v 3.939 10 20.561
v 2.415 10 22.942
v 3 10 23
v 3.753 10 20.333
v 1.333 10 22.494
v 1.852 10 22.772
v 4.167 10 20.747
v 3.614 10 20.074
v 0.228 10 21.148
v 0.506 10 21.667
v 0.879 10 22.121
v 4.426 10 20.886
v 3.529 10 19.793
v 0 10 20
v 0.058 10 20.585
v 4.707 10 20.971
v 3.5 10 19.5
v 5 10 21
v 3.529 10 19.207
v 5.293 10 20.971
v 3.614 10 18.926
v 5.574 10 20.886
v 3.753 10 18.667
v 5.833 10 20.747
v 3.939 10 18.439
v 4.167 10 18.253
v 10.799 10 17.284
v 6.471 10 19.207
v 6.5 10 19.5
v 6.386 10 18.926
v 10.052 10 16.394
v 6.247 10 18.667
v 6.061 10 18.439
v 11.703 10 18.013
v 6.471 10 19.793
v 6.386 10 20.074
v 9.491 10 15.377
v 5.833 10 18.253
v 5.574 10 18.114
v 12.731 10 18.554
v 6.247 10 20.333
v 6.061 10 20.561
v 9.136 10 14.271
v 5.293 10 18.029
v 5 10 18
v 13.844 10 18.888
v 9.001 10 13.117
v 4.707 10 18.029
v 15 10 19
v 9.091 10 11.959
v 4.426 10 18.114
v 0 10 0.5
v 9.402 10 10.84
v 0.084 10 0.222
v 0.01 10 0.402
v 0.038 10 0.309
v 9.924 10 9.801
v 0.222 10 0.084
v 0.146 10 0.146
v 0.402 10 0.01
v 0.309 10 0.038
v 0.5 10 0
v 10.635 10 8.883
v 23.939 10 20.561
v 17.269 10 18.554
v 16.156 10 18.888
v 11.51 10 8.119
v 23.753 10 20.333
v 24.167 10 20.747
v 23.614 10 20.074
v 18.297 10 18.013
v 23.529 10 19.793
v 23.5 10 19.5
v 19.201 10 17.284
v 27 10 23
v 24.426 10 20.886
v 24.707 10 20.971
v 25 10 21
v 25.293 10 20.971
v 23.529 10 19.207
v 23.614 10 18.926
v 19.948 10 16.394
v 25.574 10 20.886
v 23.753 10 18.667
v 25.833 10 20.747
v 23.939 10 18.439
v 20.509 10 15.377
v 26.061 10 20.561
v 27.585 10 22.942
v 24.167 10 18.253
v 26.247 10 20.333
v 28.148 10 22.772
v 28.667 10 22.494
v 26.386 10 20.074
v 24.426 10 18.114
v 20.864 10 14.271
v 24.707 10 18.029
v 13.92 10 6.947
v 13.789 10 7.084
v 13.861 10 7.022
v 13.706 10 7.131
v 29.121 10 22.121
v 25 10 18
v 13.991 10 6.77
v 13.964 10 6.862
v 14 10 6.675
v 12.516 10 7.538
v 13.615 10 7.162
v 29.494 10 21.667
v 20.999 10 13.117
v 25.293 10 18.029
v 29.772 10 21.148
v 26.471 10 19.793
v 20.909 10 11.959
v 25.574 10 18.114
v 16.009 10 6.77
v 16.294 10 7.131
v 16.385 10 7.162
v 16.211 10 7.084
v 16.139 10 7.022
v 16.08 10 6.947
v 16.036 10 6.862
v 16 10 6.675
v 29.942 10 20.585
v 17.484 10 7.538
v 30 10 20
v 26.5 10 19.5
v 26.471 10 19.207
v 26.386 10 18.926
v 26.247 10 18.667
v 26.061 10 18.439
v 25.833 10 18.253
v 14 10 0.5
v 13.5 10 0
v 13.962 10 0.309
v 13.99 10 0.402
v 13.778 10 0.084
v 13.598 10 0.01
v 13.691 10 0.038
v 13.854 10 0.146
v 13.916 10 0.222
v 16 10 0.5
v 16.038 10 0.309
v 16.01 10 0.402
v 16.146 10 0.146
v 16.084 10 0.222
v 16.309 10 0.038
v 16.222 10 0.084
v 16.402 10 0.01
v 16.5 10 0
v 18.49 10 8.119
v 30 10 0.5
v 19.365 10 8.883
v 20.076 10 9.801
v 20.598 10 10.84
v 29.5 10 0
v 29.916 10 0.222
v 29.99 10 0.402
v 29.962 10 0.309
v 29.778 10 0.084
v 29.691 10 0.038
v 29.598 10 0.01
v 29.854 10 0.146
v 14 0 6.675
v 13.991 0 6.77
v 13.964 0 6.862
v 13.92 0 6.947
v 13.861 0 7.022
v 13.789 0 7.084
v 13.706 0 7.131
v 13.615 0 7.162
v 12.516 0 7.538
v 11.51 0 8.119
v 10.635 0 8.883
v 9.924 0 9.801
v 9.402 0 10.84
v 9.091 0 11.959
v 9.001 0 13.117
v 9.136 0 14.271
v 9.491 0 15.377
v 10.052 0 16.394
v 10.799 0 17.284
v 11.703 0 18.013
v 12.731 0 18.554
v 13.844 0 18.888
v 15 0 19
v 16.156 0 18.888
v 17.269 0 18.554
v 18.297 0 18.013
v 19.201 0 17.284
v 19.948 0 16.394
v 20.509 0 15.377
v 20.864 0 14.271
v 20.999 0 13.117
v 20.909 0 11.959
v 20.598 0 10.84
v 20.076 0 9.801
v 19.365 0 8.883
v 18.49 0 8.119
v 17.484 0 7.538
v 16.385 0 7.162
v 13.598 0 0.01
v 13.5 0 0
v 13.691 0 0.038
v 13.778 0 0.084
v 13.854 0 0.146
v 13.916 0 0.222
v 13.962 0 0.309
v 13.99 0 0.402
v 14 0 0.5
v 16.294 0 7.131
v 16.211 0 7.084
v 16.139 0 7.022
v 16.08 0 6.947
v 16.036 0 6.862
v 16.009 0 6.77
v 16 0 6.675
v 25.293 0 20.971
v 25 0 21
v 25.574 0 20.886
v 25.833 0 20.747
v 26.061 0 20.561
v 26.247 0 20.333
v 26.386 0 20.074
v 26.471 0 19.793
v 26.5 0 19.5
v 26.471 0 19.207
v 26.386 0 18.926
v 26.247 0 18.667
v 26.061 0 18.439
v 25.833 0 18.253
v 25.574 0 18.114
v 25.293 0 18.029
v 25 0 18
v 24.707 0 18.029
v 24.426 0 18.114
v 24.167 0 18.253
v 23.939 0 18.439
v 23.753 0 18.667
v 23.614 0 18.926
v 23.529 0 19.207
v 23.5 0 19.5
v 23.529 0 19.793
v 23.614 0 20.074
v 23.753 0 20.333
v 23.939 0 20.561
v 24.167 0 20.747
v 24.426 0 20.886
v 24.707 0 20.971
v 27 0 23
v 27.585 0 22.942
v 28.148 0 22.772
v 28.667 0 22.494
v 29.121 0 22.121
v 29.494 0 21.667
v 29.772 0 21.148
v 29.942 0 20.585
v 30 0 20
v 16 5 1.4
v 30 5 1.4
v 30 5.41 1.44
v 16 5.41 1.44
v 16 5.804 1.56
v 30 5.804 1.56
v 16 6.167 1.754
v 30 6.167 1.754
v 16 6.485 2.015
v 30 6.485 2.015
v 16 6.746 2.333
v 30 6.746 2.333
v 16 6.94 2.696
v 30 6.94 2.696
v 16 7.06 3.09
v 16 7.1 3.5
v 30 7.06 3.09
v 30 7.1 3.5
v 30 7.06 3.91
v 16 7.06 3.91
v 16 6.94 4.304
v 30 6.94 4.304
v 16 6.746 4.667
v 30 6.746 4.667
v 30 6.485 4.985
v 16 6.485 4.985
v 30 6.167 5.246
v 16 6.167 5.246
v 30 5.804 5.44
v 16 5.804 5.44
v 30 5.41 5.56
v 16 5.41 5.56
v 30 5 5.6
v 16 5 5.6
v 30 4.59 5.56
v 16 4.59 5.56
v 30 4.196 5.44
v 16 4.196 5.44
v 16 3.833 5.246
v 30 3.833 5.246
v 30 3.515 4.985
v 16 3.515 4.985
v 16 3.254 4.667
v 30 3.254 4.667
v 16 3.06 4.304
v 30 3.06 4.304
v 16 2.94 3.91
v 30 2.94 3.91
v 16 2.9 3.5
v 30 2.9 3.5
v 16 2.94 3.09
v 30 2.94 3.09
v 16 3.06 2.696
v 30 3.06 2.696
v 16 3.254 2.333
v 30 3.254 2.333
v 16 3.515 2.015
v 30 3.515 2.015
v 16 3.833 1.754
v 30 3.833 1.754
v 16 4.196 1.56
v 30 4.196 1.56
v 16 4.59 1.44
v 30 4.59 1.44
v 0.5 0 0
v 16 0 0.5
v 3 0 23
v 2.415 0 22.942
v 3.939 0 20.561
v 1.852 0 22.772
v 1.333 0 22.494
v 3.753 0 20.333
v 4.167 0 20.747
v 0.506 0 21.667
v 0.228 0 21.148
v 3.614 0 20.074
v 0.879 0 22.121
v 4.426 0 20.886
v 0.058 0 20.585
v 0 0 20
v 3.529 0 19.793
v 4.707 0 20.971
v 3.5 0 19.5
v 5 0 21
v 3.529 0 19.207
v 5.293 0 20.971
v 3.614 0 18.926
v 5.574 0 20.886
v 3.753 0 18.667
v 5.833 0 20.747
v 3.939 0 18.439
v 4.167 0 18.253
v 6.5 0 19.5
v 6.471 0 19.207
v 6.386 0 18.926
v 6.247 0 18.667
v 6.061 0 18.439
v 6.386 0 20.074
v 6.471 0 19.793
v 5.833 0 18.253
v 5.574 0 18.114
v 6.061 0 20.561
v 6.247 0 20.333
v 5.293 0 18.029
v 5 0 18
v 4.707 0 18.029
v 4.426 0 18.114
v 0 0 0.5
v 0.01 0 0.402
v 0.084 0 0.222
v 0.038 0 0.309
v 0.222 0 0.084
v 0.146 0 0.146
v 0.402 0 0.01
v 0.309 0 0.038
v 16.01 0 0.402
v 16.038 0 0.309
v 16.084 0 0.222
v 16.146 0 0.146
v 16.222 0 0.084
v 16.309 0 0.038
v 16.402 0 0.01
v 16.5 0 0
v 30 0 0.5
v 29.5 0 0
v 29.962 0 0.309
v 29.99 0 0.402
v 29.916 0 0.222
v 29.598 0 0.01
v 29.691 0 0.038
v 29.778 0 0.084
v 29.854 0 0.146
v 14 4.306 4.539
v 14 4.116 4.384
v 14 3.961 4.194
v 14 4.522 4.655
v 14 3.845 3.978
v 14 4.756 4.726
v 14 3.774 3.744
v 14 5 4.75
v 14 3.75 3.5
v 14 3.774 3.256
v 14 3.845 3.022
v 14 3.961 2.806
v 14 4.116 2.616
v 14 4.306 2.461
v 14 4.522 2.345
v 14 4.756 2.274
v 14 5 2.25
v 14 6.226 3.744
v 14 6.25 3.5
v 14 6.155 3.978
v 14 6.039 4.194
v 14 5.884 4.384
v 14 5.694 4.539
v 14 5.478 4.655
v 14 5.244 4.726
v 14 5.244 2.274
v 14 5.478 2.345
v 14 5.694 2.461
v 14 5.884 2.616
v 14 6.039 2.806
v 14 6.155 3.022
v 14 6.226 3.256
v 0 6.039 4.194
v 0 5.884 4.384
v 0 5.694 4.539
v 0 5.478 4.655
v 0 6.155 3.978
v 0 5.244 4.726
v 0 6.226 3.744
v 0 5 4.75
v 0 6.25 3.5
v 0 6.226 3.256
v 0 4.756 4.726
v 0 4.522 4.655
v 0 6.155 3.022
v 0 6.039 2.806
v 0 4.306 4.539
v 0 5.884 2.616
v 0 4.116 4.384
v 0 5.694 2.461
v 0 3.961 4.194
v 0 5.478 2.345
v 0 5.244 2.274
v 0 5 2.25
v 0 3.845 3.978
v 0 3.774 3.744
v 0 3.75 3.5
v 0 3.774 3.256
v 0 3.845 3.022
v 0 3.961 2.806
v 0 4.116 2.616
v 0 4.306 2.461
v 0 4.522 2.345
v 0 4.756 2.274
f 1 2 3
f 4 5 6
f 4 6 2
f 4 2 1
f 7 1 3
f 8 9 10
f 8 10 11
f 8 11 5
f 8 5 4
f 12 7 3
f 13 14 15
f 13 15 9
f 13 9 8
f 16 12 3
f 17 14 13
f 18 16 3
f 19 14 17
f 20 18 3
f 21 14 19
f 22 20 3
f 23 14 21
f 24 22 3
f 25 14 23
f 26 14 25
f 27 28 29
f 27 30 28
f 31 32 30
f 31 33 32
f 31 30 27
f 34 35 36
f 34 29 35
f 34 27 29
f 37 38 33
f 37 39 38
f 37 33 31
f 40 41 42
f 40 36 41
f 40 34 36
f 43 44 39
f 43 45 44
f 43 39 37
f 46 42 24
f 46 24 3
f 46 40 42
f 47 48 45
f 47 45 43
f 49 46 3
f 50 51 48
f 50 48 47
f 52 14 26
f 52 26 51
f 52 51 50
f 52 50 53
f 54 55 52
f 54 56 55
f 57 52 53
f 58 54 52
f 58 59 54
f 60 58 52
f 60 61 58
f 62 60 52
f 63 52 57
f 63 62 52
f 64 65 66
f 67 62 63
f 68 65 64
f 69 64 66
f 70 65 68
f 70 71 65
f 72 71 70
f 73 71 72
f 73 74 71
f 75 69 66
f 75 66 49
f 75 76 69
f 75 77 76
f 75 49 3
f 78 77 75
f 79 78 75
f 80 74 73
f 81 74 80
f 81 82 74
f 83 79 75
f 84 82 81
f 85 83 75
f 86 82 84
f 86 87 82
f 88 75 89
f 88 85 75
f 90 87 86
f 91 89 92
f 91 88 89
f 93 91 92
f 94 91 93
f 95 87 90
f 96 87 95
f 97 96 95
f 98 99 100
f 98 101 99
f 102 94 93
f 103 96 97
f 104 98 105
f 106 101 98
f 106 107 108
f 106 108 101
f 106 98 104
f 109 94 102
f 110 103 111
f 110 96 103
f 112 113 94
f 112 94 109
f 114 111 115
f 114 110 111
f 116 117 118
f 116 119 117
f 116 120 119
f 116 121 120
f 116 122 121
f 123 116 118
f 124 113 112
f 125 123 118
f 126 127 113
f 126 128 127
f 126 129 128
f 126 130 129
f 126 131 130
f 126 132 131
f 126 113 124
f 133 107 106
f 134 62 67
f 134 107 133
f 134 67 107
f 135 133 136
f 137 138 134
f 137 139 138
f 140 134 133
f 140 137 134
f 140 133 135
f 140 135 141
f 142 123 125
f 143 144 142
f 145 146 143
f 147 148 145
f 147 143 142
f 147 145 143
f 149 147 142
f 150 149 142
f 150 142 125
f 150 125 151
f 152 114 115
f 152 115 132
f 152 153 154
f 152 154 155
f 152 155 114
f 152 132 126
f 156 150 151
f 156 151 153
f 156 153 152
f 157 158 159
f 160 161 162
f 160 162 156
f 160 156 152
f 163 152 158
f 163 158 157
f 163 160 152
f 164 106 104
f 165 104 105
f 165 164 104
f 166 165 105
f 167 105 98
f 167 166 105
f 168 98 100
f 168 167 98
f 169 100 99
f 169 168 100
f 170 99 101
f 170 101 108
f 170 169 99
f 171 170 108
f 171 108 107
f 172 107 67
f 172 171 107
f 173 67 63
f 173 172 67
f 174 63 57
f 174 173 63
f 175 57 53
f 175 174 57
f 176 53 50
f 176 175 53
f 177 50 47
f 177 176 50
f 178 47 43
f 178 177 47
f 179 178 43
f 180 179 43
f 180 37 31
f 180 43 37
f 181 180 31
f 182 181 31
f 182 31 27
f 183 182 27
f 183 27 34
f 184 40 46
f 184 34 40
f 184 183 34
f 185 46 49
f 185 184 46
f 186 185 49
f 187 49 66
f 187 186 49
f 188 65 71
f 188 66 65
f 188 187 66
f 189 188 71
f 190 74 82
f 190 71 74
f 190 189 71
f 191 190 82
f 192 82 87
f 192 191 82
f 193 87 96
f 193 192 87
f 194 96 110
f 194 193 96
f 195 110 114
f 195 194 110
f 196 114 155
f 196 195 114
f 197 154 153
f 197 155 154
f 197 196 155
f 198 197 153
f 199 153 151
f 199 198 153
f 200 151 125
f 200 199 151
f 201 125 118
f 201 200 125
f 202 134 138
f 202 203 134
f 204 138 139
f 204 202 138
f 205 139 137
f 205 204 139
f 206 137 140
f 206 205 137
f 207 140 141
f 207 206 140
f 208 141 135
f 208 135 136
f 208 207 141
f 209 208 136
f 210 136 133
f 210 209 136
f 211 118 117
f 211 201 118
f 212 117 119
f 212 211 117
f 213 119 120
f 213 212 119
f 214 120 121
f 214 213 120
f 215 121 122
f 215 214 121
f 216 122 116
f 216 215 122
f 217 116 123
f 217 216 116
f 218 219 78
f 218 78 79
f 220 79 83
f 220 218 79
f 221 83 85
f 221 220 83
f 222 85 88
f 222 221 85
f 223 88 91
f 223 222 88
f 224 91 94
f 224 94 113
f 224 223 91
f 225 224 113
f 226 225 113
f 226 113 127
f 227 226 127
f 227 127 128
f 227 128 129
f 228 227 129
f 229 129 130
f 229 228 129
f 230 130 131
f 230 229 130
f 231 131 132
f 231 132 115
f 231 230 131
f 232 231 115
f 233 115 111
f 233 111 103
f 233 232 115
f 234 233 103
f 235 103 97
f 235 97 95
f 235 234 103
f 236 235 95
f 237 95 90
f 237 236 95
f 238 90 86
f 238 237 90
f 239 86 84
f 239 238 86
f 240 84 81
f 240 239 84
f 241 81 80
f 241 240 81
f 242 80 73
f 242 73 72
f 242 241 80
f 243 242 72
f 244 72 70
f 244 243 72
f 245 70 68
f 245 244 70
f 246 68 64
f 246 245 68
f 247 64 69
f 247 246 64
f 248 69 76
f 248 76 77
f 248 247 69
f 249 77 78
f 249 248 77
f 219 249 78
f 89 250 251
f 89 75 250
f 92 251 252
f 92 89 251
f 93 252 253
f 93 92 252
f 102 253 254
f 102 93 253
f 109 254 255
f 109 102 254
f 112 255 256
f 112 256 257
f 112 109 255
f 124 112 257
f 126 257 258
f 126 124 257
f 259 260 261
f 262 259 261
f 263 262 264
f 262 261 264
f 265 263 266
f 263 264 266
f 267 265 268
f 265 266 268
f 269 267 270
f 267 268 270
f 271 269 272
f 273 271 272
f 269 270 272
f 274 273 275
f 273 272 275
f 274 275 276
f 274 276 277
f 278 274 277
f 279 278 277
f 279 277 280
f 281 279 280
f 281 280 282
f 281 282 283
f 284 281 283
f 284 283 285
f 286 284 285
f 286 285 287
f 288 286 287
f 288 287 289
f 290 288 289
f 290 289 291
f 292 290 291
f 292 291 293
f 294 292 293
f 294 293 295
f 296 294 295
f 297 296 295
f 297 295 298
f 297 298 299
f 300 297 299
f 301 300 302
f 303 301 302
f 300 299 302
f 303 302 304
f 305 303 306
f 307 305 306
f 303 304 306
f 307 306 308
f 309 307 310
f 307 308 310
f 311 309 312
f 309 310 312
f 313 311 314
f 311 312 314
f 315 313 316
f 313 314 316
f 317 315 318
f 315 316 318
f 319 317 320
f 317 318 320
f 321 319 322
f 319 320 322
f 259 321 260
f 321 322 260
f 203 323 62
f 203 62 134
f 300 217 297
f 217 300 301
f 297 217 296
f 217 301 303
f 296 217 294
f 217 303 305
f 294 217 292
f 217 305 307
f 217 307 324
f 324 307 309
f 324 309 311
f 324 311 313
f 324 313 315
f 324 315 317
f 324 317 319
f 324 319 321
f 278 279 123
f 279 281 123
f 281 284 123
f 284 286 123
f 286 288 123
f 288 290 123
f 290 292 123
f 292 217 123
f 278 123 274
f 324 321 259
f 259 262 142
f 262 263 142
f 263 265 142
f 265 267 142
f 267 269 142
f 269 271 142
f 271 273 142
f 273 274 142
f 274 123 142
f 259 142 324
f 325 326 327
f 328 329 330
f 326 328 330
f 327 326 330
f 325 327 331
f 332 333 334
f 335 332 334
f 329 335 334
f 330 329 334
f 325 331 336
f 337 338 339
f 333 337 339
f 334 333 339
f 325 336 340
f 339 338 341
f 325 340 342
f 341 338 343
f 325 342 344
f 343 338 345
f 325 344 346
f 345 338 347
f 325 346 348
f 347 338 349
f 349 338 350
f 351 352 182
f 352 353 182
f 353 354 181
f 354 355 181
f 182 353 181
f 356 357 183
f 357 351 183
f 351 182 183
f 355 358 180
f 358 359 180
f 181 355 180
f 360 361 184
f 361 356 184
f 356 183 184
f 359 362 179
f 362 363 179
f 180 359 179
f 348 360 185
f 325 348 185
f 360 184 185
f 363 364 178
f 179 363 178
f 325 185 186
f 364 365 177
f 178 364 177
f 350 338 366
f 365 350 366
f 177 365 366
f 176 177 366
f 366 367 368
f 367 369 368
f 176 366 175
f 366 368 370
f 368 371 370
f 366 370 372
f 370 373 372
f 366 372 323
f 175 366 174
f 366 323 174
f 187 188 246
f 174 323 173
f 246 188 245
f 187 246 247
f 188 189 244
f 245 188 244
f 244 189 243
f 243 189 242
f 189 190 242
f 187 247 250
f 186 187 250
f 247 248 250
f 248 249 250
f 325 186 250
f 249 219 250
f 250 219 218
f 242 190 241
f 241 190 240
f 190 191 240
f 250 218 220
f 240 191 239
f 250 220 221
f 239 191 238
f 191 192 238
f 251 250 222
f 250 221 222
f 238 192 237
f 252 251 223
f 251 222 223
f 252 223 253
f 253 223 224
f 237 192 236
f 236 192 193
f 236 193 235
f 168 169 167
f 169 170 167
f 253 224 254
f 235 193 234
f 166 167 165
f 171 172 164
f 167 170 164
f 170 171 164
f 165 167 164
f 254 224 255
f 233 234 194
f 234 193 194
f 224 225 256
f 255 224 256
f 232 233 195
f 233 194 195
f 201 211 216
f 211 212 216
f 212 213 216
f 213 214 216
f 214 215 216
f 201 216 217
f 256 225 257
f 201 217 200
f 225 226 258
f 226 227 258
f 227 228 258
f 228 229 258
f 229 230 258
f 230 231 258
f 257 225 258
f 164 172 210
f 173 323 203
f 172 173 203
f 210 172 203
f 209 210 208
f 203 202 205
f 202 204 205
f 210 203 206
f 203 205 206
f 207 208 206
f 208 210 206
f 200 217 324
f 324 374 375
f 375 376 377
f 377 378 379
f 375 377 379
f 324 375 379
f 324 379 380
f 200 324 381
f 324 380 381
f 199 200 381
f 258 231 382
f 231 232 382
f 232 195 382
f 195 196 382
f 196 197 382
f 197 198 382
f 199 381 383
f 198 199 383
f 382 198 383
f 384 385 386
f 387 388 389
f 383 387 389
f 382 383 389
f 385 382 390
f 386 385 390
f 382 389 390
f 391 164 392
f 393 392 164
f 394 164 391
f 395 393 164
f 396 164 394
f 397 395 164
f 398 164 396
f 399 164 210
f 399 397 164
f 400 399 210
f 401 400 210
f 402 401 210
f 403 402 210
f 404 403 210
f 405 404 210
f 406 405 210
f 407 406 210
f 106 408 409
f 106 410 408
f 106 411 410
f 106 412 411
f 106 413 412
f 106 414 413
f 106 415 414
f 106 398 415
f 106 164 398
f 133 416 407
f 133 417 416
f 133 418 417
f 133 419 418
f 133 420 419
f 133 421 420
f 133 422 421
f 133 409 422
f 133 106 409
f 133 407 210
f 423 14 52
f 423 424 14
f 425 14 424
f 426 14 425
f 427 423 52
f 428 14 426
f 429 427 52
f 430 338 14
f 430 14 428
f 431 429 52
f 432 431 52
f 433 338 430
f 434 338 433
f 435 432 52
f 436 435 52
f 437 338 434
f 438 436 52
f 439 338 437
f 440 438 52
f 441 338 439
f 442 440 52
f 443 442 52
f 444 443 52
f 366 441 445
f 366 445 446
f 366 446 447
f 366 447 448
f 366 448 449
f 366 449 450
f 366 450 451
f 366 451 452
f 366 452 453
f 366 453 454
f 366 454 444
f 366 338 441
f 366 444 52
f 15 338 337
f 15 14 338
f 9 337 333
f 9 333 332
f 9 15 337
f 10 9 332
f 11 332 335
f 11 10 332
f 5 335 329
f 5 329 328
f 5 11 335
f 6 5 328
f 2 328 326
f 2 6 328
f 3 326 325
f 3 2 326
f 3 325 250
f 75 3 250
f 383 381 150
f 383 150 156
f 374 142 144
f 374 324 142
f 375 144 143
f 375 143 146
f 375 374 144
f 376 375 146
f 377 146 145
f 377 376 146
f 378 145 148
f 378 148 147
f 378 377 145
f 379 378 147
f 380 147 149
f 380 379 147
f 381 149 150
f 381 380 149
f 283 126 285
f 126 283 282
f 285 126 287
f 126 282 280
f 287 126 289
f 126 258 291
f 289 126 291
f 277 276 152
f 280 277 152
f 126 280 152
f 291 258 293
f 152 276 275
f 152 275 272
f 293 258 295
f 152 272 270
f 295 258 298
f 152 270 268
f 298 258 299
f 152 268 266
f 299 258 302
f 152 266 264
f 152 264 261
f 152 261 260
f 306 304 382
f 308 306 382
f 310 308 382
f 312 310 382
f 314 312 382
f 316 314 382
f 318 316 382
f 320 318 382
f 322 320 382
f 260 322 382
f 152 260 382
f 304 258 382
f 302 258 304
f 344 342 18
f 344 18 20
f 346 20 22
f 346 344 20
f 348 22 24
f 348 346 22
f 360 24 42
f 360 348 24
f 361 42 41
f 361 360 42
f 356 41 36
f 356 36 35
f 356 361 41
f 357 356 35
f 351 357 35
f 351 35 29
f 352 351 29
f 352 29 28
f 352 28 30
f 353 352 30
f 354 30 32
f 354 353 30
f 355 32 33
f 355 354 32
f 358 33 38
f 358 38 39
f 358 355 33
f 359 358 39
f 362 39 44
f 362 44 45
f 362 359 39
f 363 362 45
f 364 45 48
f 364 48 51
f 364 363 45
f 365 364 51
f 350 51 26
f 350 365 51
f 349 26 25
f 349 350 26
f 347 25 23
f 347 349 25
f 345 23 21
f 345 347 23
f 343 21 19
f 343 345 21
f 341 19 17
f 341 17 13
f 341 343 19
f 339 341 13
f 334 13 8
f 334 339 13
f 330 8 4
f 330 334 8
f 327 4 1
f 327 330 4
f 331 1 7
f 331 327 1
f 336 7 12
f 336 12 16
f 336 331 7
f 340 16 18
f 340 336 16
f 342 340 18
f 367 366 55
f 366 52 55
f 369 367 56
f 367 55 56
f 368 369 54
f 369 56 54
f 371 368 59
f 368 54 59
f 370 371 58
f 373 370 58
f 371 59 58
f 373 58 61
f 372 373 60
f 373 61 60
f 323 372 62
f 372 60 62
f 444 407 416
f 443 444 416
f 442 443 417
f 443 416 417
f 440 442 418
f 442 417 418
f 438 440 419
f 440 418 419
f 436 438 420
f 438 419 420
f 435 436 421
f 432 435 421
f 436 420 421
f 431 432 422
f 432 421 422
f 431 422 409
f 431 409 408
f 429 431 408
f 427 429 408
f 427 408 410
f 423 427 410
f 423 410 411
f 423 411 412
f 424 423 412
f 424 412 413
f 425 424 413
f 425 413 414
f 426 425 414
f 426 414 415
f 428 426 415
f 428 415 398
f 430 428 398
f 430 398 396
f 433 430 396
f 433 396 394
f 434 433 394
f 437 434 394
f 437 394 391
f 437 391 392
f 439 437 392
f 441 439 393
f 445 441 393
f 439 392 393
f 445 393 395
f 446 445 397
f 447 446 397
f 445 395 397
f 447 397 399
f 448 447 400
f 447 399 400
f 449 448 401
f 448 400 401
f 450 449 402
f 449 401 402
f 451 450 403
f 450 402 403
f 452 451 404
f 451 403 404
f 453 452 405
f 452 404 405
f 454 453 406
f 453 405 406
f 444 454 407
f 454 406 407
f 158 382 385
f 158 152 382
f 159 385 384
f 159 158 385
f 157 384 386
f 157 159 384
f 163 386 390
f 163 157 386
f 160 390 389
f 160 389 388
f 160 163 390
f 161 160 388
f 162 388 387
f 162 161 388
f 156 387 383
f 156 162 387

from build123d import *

# Parameters (mm, degrees)
SKETCH1_W           = 30
SKETCH1_H           = 23
SKETCH1_R           = 6
SKETCH1_R_2         = 1.5
BOSS_EXTRUDE1_DEPTH = 10
SKETCH2_W           = 2
SKETCH2_H           = 15
CUT_EXTRUDE1_DEPTH  = 10
CUT_EXTRUDE2_REACH  = 41.102
SKETCH3_R           = 2.1
SKETCH4_R           = 1.25
CUT_EXTRUDE3_DEPTH  = 20
FILLET1_R           = 3
FILLET2_R           = 0.5


with BuildPart() as part:
    # Sketch1 → Boss-Extrude1 (new body)
    with BuildSketch(Plane(origin=(0, 0, 0), x_dir=(1, 0, 0), z_dir=(0, 1, 0))):
        with Locations((15, -11.5)):
            Rectangle(SKETCH1_W, SKETCH1_H)
        with Locations(Location((15, -13, 0), (0, 0, 270))):
            Circle(SKETCH1_R, mode=Mode.SUBTRACT)
        with Locations(Location((5, -19.5, 0), (0, 0, 270))):
            Circle(SKETCH1_R_2, mode=Mode.SUBTRACT)
        with Locations(Location((25, -19.5, 0), (0, 0, 270))):
            Circle(SKETCH1_R_2, mode=Mode.SUBTRACT)
    extrude(amount=BOSS_EXTRUDE1_DEPTH)

    # Sketch2 → Cut-Extrude1 (cut)
    with BuildSketch(Plane(origin=(0, 10, 0), x_dir=(1, 0, 0), z_dir=(0, 1, 0))):
        with Locations((15, -4.5)):
            Rectangle(SKETCH2_W, SKETCH2_H)
    extrude(amount=-CUT_EXTRUDE1_DEPTH, mode=Mode.SUBTRACT)

    # Sketch3 → Cut-Extrude2 (cut, up to next)
    with BuildSketch(Plane(origin=(30, 0, 0), x_dir=(0, 0, -1), z_dir=(1, 0, 0)), mode=Mode.PRIVATE) as cut_extrude2_sk1:
        with Locations((-3.5, 5)):
            Circle(SKETCH3_R)
    cut_extrude2_tool1 = extrude(cut_extrude2_sk1.sketch, amount=-CUT_EXTRUDE2_REACH, mode=Mode.PRIVATE) & part.part
    add(cut_extrude2_tool1.solids().sort_by_distance((30, 5, 3.5))[0], mode=Mode.SUBTRACT)

    # Sketch4 → Cut-Extrude3 (cut)
    with BuildSketch(Plane(origin=(14, 0, 0), x_dir=(0, 0, -1), z_dir=(1, 0, 0))):
        with Locations((-3.5, 5)):
            Circle(SKETCH4_R)
    extrude(amount=-CUT_EXTRUDE3_DEPTH, mode=Mode.SUBTRACT)

    # Fillet1
    fillet1_edges = [part.edges().sort_by_distance(p)[0] for p in [
        (30, 5, 23),
        (0, 5, 23),
    ]]
    fillet(fillet1_edges, radius=FILLET1_R)

    # Fillet2
    fillet2_edges = [part.edges().sort_by_distance(p)[0] for p in [
        (14, 5, 7.083920217),
        (16, 5, 7.083920217),
        (16, 5, 0),
        (14, 5, 0),
        (0, 5, 0),
        (30, 5, 0),
    ]]
    fillet(fillet2_edges, radius=FILLET2_R)


solid = part.part
